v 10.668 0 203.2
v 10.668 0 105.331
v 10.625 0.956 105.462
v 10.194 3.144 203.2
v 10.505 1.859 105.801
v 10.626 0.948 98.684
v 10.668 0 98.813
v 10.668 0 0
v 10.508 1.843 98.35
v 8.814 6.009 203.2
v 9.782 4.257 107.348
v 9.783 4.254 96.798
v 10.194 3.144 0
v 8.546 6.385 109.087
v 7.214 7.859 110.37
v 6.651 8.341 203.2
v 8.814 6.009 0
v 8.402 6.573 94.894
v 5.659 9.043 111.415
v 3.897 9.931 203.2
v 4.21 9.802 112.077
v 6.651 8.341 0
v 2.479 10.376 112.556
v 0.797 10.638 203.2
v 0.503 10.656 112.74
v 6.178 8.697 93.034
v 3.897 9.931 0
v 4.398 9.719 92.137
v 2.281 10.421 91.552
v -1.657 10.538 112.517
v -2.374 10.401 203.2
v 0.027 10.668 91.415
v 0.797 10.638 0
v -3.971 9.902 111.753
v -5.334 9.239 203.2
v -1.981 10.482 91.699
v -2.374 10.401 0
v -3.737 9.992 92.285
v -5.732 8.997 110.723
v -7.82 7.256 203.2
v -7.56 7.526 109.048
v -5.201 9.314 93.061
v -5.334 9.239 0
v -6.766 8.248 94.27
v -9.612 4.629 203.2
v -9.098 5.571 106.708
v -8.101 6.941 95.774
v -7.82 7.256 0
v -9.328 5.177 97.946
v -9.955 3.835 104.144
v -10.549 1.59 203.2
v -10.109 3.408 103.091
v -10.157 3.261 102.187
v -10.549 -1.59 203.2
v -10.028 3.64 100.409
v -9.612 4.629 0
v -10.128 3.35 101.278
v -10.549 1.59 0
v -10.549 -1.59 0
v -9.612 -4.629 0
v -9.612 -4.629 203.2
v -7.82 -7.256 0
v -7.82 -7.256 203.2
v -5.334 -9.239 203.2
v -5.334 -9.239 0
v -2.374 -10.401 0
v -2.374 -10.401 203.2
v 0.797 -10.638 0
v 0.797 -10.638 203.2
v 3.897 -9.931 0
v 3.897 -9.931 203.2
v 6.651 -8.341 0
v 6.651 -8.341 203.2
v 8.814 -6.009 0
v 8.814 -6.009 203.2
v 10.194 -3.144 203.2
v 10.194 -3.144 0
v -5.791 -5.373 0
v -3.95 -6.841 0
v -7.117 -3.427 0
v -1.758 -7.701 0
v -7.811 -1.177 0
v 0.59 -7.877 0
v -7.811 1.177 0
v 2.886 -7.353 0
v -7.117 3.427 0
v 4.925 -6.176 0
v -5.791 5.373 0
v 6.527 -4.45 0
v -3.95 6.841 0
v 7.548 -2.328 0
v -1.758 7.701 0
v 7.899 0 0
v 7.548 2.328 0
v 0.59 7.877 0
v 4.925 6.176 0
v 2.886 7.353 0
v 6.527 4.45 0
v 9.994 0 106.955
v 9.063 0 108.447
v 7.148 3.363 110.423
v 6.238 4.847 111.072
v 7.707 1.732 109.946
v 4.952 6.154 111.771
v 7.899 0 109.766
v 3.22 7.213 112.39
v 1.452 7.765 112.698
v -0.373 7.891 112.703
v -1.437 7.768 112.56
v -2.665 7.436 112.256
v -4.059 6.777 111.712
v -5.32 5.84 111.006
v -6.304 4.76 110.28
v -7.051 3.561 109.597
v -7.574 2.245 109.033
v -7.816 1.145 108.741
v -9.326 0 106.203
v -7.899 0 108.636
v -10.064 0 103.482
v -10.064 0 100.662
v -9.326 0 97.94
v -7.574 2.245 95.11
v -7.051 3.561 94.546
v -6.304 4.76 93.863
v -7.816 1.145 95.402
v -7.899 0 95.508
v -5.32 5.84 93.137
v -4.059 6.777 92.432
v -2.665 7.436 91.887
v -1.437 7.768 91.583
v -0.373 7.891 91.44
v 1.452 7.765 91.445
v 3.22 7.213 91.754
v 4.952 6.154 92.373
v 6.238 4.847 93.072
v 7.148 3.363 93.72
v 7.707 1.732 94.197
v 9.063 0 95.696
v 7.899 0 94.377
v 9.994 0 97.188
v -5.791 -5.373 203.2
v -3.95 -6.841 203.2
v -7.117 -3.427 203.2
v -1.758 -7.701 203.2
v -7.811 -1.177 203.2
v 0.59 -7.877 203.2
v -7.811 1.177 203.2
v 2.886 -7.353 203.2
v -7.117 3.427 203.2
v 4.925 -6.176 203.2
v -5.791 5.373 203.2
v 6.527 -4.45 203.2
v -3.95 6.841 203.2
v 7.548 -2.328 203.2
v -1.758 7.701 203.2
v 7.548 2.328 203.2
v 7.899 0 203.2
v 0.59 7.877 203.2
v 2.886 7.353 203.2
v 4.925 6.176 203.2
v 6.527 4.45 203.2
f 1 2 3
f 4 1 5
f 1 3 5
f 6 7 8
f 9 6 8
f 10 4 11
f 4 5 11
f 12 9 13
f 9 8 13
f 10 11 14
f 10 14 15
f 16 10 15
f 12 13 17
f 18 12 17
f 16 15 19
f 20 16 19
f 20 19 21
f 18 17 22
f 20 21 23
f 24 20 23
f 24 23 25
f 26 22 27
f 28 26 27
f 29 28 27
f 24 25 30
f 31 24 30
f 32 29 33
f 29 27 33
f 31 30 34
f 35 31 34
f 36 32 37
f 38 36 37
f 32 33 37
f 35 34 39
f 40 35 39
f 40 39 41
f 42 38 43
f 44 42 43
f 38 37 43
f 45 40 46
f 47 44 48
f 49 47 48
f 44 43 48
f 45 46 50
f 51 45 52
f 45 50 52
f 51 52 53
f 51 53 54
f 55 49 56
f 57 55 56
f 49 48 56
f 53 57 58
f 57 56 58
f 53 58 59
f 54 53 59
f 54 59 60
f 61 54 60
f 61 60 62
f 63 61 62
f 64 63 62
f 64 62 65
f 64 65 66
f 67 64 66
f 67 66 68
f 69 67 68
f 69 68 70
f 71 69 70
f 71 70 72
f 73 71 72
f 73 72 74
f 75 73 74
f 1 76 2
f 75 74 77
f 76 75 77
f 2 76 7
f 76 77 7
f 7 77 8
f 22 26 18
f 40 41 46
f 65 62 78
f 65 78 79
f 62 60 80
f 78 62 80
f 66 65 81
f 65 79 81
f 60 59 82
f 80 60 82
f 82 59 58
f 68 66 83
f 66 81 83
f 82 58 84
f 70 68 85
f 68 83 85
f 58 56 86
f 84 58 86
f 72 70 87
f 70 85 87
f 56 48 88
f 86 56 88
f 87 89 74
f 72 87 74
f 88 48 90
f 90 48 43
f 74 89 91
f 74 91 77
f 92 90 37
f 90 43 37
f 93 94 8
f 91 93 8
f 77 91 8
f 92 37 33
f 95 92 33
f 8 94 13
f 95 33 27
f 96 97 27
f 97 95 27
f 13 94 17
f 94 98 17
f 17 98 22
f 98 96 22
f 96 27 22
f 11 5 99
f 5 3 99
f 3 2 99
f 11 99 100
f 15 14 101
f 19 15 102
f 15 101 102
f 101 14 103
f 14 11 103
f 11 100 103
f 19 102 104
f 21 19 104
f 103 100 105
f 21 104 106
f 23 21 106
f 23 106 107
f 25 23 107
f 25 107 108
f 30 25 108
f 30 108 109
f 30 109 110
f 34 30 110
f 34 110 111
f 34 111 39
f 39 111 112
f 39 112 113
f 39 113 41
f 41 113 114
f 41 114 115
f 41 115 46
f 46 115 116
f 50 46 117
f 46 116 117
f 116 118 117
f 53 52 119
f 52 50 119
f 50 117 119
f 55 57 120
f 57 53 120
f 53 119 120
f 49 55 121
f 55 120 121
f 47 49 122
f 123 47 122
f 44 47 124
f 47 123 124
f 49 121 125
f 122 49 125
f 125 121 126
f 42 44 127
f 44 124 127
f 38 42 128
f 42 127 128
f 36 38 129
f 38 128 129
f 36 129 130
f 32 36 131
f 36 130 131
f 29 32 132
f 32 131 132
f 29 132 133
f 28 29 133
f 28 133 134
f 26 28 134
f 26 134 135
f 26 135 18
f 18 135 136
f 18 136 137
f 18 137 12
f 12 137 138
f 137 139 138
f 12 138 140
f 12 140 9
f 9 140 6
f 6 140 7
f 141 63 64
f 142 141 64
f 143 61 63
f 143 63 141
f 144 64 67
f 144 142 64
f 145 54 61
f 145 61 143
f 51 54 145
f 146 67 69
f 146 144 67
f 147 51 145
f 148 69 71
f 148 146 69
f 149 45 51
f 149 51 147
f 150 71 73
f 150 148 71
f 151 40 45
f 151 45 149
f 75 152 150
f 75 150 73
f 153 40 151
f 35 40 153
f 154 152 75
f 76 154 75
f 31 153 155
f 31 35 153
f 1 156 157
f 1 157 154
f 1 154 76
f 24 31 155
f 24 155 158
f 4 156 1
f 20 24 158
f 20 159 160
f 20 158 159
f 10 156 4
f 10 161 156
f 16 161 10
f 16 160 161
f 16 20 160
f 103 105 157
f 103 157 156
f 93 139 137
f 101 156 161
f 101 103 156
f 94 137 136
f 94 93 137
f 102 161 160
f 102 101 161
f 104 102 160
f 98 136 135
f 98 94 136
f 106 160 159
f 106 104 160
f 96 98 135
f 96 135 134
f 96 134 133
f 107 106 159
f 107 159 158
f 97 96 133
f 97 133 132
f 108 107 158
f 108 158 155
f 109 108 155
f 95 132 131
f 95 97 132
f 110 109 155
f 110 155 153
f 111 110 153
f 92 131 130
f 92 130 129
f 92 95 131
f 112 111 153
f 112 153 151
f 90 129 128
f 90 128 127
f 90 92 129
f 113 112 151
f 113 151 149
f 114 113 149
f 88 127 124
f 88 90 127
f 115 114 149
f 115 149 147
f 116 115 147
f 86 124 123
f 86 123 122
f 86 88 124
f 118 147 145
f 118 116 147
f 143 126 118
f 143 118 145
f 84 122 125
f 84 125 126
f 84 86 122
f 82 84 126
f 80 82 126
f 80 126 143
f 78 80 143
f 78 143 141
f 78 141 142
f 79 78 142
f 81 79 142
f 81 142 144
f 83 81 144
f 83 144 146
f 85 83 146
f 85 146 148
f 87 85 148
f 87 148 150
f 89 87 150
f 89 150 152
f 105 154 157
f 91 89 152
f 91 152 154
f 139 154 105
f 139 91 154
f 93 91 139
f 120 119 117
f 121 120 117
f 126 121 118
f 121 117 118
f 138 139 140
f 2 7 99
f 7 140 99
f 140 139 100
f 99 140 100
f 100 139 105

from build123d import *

# Parameters (mm, degrees)
F0_R     = 10.668
F0_R_2   = 7.8994
F1_DEPTH = 203.2
F2_R     = 10.668
F2_R_2   = 7.8994
F3_DEPTH = 25.4


with BuildPart() as f1:
    # F0 (on Top) → F1 (new body)
    with BuildSketch(Plane.XY):
        Circle(F0_R)
        Circle(F0_R_2, mode=Mode.SUBTRACT)
    extrude(amount=F1_DEPTH)

    # F2 (on Front) → F3 (cut)
    with BuildSketch(Plane.XZ):
        with Locations((0.5100271213, 102.0716684638)):
            Circle(F2_R)
        with Locations((0.5100271213, 102.0716684638)):
            Circle(F2_R_2, mode=Mode.SUBTRACT)
        with Locations((0.5100271213, 102.0716684638)):
            Circle(F2_R_2)
    extrude(amount=-F3_DEPTH, mode=Mode.SUBTRACT)


solid = f1.part
